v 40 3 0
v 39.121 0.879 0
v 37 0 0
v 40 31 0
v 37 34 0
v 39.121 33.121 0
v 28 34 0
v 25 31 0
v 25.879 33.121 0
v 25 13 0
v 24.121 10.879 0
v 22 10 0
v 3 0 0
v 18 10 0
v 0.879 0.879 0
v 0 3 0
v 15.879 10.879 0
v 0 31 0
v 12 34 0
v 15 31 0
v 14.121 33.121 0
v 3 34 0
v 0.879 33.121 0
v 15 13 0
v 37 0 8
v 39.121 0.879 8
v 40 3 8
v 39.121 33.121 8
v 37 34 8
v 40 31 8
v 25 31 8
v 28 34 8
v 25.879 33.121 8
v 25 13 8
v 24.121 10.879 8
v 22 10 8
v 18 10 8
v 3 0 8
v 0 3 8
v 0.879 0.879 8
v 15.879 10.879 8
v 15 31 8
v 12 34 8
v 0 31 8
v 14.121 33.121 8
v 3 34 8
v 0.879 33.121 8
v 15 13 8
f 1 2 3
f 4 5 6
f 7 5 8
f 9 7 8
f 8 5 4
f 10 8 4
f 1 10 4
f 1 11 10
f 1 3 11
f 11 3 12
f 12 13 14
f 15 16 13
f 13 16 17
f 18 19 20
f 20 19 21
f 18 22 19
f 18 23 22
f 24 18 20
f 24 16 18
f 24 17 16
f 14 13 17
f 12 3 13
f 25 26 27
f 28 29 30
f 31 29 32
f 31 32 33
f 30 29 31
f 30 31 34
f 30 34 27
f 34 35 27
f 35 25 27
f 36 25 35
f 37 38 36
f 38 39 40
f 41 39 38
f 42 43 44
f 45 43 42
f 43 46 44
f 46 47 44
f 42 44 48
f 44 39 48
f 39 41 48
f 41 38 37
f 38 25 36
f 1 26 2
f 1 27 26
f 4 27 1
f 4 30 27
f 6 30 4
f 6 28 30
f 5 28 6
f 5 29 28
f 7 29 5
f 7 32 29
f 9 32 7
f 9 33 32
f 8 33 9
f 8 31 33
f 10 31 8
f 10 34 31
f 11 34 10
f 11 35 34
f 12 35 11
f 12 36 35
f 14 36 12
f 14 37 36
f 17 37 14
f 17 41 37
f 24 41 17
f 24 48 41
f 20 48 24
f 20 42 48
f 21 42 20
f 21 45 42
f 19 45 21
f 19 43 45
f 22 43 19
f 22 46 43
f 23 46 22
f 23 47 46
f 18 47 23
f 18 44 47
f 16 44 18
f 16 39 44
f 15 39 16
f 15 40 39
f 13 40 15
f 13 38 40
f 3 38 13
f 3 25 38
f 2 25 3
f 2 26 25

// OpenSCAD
$fn = 32;

// ----------------------------------------------------------------------
// Eye lug: clevis, 8 mm thick
// ----------------------------------------------------------------------

// --- parameters (mm) ---
profile_height = 8;       // extrusion height
profile_points = 24;      // points of the closed outline

profile = [[0, 3], [0.879, 0.879], [3, 0], [37, 0], [39.121, 0.879], [40, 3], [40, 31], [39.121, 33.121], [37, 34], [28, 34], [25.879, 33.121], [25, 31], [25, 13], [24.121, 10.879], [22, 10], [18, 10], [15.879, 10.879], [15, 13], [15, 31], [14.121, 33.121], [12, 34], [3, 34], [0.879, 33.121], [0, 31]];  // single closed polygon, 24 points, counter clockwise

// --- the one profile operation ---
linear_extrude(height = profile_height) polygon(points = profile);
